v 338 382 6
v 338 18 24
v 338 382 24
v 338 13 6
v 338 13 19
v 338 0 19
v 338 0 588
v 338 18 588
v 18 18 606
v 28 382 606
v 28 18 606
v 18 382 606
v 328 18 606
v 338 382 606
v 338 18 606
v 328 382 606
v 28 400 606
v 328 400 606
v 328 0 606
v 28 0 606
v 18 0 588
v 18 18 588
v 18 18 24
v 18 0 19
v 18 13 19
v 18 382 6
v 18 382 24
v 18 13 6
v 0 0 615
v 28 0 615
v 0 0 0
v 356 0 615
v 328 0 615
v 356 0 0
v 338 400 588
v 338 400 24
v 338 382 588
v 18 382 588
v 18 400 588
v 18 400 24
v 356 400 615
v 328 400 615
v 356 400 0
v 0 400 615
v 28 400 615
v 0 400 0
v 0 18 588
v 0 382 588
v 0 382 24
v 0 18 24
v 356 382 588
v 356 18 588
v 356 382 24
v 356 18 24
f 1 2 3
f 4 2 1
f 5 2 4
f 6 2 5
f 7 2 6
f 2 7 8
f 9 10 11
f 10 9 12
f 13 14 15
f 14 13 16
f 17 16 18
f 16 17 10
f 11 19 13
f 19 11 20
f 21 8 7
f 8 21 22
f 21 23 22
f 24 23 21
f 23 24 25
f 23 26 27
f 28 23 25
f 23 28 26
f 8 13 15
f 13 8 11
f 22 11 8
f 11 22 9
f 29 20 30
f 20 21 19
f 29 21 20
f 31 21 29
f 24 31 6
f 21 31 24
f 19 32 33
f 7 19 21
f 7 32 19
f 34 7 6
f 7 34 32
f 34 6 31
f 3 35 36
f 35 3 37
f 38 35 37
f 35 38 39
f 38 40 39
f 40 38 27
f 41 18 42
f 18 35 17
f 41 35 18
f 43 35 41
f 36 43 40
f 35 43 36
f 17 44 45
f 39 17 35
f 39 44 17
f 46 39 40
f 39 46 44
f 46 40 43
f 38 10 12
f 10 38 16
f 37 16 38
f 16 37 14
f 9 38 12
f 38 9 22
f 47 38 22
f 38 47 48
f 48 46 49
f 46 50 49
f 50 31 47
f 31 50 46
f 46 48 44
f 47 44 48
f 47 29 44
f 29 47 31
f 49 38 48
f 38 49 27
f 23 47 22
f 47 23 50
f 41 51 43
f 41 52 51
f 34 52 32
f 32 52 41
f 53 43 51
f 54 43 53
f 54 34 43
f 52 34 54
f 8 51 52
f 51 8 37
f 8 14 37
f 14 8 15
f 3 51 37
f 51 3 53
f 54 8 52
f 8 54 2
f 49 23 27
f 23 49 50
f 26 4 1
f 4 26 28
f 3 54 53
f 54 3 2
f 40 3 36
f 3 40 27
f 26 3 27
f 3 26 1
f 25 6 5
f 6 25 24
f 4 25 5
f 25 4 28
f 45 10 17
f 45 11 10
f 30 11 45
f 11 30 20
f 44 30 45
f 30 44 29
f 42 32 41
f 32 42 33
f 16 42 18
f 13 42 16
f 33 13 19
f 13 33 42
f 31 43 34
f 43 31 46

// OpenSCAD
l_e=300; // largeur écran mm
jeu= 10;//jeu de chaque coté mm

pp= 400; // profondeur caisse mm

t1=18; // largeur tasseau 1 (carre)
t2=13;

p1l=28; //l planche1
p1h=9;//h planche1

p1l=28; //l planche1
p1h=9;//h planche1


ll=l_e+2*jeu+2*t1; //largeur ext structure


jj=400;
kk=200;
hh=jj+kk;

ee=6; //epaisseur plateau milieu

color("grey")
cube([ll,pp,ee]);

translate([0,0,hh-t1+ee]){
color("blue") {
    translate([t1,0,0])
    cube([ll-2*t1,t1,t1]);
    translate([t1,pp-t1,0])
    cube([ll-2*t1,t1,t1]);
    }
color("red") {
    translate([0,t1,0])
    cube([t1,pp-2*t1,t1]);
    translate([ll-t1,t1,0])
    cube([t1,pp-2*t1,t1]);
    }
}
translate([0,0,ee]){
color("green") {
    translate([0,0,0])
    cube([t1,t1,hh]);
    translate([ll-t1,0,0])
    cube([t1,t1,hh]);
    translate([0,pp-t1,0])
    cube([t1,t1,hh]);
    translate([ll-t1,pp-t1,0])
    cube([t1,t1,hh]);
    }
color("red") {
    translate([0,t1,0])
    cube([t1,pp-2*t1,t1]);
    translate([ll-t1,t1,0])
    cube([t1,pp-2*t1,t1]);
    }
color("blue") {
    translate([t1,pp-t1,0])
    cube([ll-2*t1,t1,t1]);
    }
color("blue",0.5) {
    translate([t1,0,0])
    cube([ll-2*t1,t2,t2]);
    }
}
// planches sur le cadre
translate([0,0,hh+ee]){
color("orange"){
    translate([0,0,0])
    cube([p1l,pp,p1h]);
    translate([ll-p1l,0,0])
    cube([p1l,pp,p1h]);
    }
}
